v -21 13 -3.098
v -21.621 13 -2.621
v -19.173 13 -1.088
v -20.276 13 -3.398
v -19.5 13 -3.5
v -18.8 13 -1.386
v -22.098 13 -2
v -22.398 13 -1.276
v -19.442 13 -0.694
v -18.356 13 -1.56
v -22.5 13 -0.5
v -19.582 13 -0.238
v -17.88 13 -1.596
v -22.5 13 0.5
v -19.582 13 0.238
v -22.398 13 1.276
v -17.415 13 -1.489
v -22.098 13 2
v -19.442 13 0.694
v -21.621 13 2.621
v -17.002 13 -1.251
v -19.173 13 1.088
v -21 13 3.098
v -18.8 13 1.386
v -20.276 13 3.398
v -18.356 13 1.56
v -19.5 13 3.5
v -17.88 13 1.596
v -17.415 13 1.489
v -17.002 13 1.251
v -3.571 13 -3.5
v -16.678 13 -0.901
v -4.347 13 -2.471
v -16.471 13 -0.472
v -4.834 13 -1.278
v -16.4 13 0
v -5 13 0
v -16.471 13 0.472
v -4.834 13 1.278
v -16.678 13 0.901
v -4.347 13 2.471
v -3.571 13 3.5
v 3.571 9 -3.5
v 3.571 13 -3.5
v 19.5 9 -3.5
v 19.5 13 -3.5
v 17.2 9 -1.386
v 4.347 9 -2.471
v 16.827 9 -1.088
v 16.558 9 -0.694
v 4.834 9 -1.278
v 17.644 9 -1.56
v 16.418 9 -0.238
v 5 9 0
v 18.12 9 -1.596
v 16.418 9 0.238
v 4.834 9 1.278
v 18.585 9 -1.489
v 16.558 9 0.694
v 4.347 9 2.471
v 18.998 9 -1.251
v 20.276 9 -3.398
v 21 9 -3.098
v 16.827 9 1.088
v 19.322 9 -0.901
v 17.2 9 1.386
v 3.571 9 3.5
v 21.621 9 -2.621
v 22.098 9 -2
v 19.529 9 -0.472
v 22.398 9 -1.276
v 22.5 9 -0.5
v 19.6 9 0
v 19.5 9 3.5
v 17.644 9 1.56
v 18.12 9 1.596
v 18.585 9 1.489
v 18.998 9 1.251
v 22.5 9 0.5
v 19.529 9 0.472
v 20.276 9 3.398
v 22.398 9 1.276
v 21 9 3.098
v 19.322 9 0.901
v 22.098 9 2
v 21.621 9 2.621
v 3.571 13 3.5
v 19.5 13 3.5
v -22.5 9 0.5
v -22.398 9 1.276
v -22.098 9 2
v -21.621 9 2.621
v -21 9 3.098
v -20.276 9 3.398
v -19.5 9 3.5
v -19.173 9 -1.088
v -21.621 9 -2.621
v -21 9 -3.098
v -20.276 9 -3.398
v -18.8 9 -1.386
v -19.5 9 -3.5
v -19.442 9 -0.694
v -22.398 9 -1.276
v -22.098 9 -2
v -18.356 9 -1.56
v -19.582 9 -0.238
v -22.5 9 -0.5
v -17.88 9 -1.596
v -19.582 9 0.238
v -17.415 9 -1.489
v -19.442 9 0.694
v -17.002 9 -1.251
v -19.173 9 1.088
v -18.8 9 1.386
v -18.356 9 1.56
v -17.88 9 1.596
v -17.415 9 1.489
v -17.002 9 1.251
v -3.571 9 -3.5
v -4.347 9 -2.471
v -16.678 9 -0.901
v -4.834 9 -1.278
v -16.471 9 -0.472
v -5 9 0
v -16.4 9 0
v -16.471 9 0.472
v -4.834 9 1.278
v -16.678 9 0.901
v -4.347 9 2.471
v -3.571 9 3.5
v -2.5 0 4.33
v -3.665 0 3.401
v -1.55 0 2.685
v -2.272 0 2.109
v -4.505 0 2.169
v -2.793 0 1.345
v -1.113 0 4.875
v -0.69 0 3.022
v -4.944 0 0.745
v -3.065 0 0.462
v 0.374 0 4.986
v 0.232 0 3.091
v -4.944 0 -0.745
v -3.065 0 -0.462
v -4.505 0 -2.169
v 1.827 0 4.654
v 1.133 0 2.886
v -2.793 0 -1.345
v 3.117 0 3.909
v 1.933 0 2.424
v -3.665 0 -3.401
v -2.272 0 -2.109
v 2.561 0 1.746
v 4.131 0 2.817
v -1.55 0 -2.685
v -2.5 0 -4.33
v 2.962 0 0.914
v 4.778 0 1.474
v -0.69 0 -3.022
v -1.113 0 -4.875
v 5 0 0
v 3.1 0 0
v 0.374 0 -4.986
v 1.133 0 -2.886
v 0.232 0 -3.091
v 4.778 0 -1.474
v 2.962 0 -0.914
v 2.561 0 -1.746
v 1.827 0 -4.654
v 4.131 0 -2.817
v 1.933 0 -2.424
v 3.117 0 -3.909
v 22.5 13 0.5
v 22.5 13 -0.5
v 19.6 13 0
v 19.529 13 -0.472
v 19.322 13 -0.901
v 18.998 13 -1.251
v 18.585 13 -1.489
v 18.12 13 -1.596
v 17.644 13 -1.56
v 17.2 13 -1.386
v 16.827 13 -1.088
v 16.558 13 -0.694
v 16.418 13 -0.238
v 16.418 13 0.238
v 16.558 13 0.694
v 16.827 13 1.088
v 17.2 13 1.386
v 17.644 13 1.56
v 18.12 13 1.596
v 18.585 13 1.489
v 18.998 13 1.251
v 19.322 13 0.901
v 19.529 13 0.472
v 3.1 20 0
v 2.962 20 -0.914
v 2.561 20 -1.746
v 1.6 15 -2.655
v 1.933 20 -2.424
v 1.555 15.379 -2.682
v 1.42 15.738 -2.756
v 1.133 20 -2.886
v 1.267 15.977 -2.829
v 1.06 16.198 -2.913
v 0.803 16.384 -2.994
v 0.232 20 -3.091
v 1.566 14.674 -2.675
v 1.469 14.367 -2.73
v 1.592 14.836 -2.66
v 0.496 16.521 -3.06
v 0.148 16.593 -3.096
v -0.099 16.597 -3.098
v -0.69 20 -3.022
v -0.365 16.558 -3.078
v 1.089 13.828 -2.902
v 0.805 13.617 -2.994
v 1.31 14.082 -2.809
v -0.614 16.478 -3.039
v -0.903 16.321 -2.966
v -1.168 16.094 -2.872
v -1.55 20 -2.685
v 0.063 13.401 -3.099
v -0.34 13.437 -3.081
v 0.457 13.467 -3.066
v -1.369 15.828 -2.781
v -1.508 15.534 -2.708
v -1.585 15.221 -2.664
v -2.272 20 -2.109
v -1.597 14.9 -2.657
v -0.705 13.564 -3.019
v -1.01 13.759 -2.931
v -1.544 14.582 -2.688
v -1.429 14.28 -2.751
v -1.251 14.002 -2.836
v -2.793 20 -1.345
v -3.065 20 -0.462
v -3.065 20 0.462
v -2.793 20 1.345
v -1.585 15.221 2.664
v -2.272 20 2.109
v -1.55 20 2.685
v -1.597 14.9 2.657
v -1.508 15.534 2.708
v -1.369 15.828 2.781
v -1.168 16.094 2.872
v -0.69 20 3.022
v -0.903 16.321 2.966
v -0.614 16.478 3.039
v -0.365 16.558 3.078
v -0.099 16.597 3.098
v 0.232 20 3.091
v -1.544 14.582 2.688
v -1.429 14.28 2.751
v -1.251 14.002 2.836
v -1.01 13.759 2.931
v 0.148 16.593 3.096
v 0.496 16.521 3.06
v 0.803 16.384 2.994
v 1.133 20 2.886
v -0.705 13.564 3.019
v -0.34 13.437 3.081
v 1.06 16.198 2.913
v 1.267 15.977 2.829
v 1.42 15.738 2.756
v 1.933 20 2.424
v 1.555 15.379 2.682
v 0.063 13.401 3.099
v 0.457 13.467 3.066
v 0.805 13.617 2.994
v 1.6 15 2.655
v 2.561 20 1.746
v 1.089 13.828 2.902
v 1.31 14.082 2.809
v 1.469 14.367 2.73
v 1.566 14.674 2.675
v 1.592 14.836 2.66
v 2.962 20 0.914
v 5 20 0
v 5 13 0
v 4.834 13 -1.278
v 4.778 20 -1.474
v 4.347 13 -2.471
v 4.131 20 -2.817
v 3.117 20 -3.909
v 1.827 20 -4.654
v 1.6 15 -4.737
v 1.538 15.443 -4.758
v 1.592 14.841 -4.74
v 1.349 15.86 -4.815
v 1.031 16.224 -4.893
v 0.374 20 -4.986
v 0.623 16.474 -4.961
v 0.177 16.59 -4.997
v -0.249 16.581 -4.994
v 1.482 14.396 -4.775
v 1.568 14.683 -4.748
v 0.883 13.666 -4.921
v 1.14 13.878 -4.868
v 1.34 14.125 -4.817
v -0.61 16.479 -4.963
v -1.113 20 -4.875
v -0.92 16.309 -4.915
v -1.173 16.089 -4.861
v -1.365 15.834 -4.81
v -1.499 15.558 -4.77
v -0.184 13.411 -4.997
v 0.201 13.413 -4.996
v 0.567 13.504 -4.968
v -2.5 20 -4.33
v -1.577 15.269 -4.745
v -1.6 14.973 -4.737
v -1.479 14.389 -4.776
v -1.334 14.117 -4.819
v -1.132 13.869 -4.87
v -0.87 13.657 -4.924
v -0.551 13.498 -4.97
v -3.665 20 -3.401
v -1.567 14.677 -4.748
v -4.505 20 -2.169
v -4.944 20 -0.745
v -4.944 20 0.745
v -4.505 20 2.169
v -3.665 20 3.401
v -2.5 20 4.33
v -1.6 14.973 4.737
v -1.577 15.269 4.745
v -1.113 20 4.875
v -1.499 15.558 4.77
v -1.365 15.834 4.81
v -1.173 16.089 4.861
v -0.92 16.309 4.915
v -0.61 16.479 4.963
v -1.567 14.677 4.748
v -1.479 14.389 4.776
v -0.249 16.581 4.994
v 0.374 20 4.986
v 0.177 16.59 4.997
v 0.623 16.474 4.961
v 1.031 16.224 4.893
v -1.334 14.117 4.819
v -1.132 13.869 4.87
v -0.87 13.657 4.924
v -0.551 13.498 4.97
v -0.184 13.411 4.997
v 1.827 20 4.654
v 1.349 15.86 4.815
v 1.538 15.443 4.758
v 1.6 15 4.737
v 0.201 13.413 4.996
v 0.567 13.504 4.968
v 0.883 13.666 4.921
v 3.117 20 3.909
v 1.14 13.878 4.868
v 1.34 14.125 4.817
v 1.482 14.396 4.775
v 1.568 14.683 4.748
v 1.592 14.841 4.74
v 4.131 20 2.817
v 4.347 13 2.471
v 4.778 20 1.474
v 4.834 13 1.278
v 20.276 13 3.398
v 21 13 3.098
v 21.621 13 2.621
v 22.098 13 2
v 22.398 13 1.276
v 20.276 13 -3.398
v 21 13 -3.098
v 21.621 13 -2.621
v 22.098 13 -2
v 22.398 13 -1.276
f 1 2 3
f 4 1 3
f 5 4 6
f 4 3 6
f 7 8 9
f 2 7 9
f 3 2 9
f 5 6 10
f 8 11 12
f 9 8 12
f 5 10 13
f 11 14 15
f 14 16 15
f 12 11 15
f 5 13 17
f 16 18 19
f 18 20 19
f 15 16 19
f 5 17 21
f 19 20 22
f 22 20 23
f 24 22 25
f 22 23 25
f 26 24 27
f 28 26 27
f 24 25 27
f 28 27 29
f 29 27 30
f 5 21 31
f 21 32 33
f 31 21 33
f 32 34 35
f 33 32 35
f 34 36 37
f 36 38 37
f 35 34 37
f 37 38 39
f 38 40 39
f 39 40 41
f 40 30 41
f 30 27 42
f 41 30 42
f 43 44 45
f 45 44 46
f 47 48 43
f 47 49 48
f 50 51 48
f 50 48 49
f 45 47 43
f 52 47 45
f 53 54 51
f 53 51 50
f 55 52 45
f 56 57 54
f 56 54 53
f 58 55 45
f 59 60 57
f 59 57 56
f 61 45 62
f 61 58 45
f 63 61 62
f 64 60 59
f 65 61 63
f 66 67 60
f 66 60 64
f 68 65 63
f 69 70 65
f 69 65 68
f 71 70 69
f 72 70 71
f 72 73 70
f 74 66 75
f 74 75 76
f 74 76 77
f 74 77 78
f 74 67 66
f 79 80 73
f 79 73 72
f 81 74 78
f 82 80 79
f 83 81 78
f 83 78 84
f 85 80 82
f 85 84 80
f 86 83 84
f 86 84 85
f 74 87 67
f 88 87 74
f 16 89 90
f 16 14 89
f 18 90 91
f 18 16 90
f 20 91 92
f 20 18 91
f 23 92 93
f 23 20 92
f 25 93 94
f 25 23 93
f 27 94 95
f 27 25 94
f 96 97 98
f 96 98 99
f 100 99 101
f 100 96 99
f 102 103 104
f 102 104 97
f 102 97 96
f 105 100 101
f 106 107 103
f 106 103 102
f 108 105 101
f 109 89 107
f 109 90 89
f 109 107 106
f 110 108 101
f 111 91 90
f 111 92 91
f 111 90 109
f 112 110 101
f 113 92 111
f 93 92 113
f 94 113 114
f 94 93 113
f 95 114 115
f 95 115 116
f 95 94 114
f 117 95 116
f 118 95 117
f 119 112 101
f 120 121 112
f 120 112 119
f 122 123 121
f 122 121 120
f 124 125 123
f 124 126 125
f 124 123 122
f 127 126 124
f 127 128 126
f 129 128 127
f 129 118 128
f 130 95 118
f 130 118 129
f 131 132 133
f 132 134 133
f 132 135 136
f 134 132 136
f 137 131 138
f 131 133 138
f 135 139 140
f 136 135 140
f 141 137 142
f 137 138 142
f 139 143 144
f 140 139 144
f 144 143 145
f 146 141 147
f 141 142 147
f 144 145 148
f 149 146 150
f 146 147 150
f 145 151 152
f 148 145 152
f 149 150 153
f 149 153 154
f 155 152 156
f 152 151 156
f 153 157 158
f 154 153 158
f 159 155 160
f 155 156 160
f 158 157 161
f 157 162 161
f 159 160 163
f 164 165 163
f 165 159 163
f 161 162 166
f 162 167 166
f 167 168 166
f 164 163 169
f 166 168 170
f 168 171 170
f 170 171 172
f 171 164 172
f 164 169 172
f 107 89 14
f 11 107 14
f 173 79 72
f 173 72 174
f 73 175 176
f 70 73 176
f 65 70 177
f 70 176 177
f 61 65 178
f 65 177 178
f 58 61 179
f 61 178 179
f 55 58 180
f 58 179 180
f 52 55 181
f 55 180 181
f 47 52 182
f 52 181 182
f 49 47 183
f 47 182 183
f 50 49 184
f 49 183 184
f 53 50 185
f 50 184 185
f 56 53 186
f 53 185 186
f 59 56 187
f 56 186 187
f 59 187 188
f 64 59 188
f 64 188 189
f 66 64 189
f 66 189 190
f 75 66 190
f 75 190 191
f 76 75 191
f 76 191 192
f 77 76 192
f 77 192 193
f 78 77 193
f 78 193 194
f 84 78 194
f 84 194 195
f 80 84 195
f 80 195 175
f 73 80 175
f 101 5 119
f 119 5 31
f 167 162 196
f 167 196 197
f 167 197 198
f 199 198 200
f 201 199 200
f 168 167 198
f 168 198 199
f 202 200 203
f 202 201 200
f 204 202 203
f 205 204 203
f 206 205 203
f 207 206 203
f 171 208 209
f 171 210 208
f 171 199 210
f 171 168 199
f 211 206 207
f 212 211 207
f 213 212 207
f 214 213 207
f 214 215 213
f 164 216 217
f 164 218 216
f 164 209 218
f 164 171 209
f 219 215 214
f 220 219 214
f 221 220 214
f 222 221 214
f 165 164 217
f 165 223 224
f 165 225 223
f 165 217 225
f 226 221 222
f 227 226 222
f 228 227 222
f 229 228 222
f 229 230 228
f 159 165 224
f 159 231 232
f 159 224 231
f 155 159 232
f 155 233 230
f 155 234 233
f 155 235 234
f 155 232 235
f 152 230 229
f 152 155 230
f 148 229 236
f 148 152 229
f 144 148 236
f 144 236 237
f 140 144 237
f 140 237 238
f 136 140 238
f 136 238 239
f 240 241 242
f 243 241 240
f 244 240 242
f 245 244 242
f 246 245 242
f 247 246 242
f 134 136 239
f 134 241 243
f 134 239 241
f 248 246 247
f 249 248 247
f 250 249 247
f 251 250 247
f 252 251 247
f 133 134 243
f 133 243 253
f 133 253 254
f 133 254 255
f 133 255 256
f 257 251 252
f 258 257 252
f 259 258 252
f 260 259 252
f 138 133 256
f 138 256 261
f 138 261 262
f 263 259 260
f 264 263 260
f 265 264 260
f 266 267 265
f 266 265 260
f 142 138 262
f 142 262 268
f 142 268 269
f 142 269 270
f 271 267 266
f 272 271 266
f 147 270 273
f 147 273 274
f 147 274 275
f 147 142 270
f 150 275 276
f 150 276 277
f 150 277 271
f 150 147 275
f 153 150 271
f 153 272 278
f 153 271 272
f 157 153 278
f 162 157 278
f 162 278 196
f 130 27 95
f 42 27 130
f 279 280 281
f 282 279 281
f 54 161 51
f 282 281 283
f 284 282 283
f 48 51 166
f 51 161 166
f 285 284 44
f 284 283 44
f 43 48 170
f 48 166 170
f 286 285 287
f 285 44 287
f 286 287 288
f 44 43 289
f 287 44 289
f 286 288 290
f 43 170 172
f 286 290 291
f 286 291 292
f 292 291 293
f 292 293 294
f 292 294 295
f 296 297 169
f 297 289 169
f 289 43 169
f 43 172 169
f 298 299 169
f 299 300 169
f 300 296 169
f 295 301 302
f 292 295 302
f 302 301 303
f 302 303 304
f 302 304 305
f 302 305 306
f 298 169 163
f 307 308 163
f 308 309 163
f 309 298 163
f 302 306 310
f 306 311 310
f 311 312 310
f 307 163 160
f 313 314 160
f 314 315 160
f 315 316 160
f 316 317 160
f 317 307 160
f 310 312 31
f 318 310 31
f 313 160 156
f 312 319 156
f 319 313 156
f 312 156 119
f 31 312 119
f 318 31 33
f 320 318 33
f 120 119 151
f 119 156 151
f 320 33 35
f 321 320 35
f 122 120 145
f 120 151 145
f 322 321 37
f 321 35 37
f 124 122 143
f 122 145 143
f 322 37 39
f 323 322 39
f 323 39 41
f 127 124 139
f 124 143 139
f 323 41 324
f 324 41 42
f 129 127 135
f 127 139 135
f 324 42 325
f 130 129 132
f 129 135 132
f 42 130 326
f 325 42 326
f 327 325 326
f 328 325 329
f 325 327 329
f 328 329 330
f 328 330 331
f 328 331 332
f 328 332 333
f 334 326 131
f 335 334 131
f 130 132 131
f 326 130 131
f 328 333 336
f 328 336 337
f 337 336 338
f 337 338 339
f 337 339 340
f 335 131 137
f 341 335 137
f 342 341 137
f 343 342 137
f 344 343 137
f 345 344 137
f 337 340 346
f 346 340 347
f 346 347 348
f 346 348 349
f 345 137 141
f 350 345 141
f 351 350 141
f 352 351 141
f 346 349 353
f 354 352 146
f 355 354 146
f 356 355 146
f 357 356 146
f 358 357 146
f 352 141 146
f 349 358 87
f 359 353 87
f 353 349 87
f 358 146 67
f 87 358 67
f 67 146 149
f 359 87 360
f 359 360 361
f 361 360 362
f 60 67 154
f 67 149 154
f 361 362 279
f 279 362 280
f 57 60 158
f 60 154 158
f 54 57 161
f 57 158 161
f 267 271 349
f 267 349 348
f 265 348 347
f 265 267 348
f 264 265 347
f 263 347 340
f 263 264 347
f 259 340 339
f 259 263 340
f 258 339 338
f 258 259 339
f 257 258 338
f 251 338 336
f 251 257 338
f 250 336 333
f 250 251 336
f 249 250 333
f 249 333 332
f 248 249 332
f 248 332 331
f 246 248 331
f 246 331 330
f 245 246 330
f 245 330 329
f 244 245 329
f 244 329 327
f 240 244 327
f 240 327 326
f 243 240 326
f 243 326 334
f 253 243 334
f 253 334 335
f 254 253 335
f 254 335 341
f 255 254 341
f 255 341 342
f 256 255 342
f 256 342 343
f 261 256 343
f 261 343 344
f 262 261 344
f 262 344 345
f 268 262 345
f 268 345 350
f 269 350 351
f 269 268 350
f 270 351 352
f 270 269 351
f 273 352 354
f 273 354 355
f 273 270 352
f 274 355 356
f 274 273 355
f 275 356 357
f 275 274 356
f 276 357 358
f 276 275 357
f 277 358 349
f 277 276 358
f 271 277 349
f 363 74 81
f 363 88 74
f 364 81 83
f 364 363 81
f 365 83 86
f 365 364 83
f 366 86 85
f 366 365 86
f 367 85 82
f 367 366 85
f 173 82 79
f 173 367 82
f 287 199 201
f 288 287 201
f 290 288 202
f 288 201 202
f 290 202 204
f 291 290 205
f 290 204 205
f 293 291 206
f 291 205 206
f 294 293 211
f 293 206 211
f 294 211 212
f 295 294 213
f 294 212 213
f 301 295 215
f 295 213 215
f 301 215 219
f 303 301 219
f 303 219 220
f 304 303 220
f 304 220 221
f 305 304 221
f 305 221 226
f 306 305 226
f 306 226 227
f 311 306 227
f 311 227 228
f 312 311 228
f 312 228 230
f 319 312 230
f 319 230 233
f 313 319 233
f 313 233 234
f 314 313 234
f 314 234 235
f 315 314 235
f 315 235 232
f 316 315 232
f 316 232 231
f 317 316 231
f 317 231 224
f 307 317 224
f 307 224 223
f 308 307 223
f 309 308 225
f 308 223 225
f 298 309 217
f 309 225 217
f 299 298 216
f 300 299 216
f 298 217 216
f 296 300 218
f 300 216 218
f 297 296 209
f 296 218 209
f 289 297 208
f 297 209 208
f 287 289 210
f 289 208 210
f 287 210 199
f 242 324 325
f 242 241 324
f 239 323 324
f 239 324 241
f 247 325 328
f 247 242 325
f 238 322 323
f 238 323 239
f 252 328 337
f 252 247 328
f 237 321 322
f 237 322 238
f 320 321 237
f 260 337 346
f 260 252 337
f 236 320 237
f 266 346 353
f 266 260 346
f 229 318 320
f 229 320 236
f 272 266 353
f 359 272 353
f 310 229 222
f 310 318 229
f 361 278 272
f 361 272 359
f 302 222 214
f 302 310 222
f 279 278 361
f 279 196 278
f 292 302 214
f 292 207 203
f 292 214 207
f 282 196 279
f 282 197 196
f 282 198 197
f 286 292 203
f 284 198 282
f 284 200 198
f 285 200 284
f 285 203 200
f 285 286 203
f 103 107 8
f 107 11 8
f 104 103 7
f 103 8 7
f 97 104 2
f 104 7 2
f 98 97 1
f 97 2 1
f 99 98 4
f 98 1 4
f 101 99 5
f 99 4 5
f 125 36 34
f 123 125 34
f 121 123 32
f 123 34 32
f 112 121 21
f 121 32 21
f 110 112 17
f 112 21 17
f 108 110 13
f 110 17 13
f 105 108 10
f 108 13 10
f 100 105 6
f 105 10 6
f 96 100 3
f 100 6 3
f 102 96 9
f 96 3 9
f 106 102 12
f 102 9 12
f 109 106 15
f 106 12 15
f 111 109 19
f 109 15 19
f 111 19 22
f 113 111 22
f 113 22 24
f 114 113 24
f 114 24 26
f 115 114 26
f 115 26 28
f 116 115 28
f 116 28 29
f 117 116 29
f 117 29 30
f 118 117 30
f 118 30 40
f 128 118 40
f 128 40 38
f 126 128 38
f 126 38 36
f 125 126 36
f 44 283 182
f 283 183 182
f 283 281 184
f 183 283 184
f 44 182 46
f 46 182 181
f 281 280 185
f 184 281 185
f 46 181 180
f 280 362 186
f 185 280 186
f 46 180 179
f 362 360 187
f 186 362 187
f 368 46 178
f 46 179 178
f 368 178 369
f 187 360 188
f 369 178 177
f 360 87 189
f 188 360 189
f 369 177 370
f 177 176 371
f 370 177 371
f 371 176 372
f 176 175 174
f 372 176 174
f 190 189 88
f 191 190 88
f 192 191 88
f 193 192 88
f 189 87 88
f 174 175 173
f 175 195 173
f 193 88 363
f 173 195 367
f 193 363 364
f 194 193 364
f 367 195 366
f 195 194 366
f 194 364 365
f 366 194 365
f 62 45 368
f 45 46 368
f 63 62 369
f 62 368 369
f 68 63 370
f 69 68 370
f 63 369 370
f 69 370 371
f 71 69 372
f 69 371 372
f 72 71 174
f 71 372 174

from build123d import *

# Parameters (mm, degrees)
SKETCH_1_R               = 5
SKETCH_1_R_2             = 3.1
EXTRUDE_1_DEPTH          = 20
SKETCH_2_W               = 45
SKETCH_2_H               = 4
EXTRUDE_2_DEPTH          = 3.5
SKETCH_4_R               = 1.6
CUT_EXTRUDE_2_DEPTH      = 14
FILLET_1_R               = 3
SKETCH_5_R               = 1.6
CUT_EXTRUDE_3_DEPTH      = 6
CUT_EXTRUDE_3_DEPTH_BACK = 6
SKETCH_3_R               = 3.1
CUT_EXTRUDE_4_DEPTH      = 8.0000001
CUT_EXTRUDE_4_DEPTH_BACK = 14.0000001


with BuildPart() as part:
    # 草图1 → 凸台-拉伸1 (new body)
    with BuildSketch(Plane(origin=(0, 0, 0), x_dir=(1, 0, 0), z_dir=(0, 1, 0))):
        Circle(SKETCH_1_R)
        Circle(SKETCH_1_R_2, mode=Mode.SUBTRACT)
    extrude(amount=EXTRUDE_1_DEPTH)

    # 草图2 → 凸台-拉伸2 (add, symmetric)
    with BuildSketch(Plane.XY):
        with Locations((0, 11)):
            Rectangle(SKETCH_2_W, SKETCH_2_H)
    extrude(amount=EXTRUDE_2_DEPTH, both=True)

    # 草图4 → 切除-拉伸2 (cut, through all)
    with BuildSketch(Plane(origin=(0, 13, 0), x_dir=(1, 0, 0), z_dir=(0, 1, 0))):
        with Locations((-18, 0)):
            Circle(SKETCH_4_R)
        with Locations((18, 0)):
            Circle(SKETCH_4_R)
    extrude(amount=-CUT_EXTRUDE_2_DEPTH, mode=Mode.SUBTRACT)

    # 圆角1
    fillet_1_edges = [part.edges().sort_by_distance(p)[0] for p in [
        (22.5, 11, 3.5),
        (-22.5, 11, 3.5),
        (-22.5, 11, -3.5),
        (22.5, 11, -3.5),
    ]]
    fillet(fillet_1_edges, radius=FILLET_1_R)

    # 草图5 → 切除-拉伸3 (cut, two sides)
    with BuildSketch(Plane.XY) as cut_extrude_3_sk:
        with Locations((0, 15)):
            Circle(SKETCH_5_R)
    extrude(amount=CUT_EXTRUDE_3_DEPTH, mode=Mode.SUBTRACT)
    extrude(cut_extrude_3_sk.sketch, amount=-CUT_EXTRUDE_3_DEPTH_BACK, mode=Mode.SUBTRACT)

    # 草图3 → 切除-拉伸4 (cut, two sides)
    with BuildSketch(Plane(origin=(0, 13, 0), x_dir=(1, 0, 0), z_dir=(0, 1, 0))) as cut_extrude_4_sk:
        Circle(SKETCH_3_R)
    extrude(amount=CUT_EXTRUDE_4_DEPTH, mode=Mode.SUBTRACT)
    extrude(cut_extrude_4_sk.sketch, amount=-CUT_EXTRUDE_4_DEPTH_BACK, mode=Mode.SUBTRACT)


solid = part.part
